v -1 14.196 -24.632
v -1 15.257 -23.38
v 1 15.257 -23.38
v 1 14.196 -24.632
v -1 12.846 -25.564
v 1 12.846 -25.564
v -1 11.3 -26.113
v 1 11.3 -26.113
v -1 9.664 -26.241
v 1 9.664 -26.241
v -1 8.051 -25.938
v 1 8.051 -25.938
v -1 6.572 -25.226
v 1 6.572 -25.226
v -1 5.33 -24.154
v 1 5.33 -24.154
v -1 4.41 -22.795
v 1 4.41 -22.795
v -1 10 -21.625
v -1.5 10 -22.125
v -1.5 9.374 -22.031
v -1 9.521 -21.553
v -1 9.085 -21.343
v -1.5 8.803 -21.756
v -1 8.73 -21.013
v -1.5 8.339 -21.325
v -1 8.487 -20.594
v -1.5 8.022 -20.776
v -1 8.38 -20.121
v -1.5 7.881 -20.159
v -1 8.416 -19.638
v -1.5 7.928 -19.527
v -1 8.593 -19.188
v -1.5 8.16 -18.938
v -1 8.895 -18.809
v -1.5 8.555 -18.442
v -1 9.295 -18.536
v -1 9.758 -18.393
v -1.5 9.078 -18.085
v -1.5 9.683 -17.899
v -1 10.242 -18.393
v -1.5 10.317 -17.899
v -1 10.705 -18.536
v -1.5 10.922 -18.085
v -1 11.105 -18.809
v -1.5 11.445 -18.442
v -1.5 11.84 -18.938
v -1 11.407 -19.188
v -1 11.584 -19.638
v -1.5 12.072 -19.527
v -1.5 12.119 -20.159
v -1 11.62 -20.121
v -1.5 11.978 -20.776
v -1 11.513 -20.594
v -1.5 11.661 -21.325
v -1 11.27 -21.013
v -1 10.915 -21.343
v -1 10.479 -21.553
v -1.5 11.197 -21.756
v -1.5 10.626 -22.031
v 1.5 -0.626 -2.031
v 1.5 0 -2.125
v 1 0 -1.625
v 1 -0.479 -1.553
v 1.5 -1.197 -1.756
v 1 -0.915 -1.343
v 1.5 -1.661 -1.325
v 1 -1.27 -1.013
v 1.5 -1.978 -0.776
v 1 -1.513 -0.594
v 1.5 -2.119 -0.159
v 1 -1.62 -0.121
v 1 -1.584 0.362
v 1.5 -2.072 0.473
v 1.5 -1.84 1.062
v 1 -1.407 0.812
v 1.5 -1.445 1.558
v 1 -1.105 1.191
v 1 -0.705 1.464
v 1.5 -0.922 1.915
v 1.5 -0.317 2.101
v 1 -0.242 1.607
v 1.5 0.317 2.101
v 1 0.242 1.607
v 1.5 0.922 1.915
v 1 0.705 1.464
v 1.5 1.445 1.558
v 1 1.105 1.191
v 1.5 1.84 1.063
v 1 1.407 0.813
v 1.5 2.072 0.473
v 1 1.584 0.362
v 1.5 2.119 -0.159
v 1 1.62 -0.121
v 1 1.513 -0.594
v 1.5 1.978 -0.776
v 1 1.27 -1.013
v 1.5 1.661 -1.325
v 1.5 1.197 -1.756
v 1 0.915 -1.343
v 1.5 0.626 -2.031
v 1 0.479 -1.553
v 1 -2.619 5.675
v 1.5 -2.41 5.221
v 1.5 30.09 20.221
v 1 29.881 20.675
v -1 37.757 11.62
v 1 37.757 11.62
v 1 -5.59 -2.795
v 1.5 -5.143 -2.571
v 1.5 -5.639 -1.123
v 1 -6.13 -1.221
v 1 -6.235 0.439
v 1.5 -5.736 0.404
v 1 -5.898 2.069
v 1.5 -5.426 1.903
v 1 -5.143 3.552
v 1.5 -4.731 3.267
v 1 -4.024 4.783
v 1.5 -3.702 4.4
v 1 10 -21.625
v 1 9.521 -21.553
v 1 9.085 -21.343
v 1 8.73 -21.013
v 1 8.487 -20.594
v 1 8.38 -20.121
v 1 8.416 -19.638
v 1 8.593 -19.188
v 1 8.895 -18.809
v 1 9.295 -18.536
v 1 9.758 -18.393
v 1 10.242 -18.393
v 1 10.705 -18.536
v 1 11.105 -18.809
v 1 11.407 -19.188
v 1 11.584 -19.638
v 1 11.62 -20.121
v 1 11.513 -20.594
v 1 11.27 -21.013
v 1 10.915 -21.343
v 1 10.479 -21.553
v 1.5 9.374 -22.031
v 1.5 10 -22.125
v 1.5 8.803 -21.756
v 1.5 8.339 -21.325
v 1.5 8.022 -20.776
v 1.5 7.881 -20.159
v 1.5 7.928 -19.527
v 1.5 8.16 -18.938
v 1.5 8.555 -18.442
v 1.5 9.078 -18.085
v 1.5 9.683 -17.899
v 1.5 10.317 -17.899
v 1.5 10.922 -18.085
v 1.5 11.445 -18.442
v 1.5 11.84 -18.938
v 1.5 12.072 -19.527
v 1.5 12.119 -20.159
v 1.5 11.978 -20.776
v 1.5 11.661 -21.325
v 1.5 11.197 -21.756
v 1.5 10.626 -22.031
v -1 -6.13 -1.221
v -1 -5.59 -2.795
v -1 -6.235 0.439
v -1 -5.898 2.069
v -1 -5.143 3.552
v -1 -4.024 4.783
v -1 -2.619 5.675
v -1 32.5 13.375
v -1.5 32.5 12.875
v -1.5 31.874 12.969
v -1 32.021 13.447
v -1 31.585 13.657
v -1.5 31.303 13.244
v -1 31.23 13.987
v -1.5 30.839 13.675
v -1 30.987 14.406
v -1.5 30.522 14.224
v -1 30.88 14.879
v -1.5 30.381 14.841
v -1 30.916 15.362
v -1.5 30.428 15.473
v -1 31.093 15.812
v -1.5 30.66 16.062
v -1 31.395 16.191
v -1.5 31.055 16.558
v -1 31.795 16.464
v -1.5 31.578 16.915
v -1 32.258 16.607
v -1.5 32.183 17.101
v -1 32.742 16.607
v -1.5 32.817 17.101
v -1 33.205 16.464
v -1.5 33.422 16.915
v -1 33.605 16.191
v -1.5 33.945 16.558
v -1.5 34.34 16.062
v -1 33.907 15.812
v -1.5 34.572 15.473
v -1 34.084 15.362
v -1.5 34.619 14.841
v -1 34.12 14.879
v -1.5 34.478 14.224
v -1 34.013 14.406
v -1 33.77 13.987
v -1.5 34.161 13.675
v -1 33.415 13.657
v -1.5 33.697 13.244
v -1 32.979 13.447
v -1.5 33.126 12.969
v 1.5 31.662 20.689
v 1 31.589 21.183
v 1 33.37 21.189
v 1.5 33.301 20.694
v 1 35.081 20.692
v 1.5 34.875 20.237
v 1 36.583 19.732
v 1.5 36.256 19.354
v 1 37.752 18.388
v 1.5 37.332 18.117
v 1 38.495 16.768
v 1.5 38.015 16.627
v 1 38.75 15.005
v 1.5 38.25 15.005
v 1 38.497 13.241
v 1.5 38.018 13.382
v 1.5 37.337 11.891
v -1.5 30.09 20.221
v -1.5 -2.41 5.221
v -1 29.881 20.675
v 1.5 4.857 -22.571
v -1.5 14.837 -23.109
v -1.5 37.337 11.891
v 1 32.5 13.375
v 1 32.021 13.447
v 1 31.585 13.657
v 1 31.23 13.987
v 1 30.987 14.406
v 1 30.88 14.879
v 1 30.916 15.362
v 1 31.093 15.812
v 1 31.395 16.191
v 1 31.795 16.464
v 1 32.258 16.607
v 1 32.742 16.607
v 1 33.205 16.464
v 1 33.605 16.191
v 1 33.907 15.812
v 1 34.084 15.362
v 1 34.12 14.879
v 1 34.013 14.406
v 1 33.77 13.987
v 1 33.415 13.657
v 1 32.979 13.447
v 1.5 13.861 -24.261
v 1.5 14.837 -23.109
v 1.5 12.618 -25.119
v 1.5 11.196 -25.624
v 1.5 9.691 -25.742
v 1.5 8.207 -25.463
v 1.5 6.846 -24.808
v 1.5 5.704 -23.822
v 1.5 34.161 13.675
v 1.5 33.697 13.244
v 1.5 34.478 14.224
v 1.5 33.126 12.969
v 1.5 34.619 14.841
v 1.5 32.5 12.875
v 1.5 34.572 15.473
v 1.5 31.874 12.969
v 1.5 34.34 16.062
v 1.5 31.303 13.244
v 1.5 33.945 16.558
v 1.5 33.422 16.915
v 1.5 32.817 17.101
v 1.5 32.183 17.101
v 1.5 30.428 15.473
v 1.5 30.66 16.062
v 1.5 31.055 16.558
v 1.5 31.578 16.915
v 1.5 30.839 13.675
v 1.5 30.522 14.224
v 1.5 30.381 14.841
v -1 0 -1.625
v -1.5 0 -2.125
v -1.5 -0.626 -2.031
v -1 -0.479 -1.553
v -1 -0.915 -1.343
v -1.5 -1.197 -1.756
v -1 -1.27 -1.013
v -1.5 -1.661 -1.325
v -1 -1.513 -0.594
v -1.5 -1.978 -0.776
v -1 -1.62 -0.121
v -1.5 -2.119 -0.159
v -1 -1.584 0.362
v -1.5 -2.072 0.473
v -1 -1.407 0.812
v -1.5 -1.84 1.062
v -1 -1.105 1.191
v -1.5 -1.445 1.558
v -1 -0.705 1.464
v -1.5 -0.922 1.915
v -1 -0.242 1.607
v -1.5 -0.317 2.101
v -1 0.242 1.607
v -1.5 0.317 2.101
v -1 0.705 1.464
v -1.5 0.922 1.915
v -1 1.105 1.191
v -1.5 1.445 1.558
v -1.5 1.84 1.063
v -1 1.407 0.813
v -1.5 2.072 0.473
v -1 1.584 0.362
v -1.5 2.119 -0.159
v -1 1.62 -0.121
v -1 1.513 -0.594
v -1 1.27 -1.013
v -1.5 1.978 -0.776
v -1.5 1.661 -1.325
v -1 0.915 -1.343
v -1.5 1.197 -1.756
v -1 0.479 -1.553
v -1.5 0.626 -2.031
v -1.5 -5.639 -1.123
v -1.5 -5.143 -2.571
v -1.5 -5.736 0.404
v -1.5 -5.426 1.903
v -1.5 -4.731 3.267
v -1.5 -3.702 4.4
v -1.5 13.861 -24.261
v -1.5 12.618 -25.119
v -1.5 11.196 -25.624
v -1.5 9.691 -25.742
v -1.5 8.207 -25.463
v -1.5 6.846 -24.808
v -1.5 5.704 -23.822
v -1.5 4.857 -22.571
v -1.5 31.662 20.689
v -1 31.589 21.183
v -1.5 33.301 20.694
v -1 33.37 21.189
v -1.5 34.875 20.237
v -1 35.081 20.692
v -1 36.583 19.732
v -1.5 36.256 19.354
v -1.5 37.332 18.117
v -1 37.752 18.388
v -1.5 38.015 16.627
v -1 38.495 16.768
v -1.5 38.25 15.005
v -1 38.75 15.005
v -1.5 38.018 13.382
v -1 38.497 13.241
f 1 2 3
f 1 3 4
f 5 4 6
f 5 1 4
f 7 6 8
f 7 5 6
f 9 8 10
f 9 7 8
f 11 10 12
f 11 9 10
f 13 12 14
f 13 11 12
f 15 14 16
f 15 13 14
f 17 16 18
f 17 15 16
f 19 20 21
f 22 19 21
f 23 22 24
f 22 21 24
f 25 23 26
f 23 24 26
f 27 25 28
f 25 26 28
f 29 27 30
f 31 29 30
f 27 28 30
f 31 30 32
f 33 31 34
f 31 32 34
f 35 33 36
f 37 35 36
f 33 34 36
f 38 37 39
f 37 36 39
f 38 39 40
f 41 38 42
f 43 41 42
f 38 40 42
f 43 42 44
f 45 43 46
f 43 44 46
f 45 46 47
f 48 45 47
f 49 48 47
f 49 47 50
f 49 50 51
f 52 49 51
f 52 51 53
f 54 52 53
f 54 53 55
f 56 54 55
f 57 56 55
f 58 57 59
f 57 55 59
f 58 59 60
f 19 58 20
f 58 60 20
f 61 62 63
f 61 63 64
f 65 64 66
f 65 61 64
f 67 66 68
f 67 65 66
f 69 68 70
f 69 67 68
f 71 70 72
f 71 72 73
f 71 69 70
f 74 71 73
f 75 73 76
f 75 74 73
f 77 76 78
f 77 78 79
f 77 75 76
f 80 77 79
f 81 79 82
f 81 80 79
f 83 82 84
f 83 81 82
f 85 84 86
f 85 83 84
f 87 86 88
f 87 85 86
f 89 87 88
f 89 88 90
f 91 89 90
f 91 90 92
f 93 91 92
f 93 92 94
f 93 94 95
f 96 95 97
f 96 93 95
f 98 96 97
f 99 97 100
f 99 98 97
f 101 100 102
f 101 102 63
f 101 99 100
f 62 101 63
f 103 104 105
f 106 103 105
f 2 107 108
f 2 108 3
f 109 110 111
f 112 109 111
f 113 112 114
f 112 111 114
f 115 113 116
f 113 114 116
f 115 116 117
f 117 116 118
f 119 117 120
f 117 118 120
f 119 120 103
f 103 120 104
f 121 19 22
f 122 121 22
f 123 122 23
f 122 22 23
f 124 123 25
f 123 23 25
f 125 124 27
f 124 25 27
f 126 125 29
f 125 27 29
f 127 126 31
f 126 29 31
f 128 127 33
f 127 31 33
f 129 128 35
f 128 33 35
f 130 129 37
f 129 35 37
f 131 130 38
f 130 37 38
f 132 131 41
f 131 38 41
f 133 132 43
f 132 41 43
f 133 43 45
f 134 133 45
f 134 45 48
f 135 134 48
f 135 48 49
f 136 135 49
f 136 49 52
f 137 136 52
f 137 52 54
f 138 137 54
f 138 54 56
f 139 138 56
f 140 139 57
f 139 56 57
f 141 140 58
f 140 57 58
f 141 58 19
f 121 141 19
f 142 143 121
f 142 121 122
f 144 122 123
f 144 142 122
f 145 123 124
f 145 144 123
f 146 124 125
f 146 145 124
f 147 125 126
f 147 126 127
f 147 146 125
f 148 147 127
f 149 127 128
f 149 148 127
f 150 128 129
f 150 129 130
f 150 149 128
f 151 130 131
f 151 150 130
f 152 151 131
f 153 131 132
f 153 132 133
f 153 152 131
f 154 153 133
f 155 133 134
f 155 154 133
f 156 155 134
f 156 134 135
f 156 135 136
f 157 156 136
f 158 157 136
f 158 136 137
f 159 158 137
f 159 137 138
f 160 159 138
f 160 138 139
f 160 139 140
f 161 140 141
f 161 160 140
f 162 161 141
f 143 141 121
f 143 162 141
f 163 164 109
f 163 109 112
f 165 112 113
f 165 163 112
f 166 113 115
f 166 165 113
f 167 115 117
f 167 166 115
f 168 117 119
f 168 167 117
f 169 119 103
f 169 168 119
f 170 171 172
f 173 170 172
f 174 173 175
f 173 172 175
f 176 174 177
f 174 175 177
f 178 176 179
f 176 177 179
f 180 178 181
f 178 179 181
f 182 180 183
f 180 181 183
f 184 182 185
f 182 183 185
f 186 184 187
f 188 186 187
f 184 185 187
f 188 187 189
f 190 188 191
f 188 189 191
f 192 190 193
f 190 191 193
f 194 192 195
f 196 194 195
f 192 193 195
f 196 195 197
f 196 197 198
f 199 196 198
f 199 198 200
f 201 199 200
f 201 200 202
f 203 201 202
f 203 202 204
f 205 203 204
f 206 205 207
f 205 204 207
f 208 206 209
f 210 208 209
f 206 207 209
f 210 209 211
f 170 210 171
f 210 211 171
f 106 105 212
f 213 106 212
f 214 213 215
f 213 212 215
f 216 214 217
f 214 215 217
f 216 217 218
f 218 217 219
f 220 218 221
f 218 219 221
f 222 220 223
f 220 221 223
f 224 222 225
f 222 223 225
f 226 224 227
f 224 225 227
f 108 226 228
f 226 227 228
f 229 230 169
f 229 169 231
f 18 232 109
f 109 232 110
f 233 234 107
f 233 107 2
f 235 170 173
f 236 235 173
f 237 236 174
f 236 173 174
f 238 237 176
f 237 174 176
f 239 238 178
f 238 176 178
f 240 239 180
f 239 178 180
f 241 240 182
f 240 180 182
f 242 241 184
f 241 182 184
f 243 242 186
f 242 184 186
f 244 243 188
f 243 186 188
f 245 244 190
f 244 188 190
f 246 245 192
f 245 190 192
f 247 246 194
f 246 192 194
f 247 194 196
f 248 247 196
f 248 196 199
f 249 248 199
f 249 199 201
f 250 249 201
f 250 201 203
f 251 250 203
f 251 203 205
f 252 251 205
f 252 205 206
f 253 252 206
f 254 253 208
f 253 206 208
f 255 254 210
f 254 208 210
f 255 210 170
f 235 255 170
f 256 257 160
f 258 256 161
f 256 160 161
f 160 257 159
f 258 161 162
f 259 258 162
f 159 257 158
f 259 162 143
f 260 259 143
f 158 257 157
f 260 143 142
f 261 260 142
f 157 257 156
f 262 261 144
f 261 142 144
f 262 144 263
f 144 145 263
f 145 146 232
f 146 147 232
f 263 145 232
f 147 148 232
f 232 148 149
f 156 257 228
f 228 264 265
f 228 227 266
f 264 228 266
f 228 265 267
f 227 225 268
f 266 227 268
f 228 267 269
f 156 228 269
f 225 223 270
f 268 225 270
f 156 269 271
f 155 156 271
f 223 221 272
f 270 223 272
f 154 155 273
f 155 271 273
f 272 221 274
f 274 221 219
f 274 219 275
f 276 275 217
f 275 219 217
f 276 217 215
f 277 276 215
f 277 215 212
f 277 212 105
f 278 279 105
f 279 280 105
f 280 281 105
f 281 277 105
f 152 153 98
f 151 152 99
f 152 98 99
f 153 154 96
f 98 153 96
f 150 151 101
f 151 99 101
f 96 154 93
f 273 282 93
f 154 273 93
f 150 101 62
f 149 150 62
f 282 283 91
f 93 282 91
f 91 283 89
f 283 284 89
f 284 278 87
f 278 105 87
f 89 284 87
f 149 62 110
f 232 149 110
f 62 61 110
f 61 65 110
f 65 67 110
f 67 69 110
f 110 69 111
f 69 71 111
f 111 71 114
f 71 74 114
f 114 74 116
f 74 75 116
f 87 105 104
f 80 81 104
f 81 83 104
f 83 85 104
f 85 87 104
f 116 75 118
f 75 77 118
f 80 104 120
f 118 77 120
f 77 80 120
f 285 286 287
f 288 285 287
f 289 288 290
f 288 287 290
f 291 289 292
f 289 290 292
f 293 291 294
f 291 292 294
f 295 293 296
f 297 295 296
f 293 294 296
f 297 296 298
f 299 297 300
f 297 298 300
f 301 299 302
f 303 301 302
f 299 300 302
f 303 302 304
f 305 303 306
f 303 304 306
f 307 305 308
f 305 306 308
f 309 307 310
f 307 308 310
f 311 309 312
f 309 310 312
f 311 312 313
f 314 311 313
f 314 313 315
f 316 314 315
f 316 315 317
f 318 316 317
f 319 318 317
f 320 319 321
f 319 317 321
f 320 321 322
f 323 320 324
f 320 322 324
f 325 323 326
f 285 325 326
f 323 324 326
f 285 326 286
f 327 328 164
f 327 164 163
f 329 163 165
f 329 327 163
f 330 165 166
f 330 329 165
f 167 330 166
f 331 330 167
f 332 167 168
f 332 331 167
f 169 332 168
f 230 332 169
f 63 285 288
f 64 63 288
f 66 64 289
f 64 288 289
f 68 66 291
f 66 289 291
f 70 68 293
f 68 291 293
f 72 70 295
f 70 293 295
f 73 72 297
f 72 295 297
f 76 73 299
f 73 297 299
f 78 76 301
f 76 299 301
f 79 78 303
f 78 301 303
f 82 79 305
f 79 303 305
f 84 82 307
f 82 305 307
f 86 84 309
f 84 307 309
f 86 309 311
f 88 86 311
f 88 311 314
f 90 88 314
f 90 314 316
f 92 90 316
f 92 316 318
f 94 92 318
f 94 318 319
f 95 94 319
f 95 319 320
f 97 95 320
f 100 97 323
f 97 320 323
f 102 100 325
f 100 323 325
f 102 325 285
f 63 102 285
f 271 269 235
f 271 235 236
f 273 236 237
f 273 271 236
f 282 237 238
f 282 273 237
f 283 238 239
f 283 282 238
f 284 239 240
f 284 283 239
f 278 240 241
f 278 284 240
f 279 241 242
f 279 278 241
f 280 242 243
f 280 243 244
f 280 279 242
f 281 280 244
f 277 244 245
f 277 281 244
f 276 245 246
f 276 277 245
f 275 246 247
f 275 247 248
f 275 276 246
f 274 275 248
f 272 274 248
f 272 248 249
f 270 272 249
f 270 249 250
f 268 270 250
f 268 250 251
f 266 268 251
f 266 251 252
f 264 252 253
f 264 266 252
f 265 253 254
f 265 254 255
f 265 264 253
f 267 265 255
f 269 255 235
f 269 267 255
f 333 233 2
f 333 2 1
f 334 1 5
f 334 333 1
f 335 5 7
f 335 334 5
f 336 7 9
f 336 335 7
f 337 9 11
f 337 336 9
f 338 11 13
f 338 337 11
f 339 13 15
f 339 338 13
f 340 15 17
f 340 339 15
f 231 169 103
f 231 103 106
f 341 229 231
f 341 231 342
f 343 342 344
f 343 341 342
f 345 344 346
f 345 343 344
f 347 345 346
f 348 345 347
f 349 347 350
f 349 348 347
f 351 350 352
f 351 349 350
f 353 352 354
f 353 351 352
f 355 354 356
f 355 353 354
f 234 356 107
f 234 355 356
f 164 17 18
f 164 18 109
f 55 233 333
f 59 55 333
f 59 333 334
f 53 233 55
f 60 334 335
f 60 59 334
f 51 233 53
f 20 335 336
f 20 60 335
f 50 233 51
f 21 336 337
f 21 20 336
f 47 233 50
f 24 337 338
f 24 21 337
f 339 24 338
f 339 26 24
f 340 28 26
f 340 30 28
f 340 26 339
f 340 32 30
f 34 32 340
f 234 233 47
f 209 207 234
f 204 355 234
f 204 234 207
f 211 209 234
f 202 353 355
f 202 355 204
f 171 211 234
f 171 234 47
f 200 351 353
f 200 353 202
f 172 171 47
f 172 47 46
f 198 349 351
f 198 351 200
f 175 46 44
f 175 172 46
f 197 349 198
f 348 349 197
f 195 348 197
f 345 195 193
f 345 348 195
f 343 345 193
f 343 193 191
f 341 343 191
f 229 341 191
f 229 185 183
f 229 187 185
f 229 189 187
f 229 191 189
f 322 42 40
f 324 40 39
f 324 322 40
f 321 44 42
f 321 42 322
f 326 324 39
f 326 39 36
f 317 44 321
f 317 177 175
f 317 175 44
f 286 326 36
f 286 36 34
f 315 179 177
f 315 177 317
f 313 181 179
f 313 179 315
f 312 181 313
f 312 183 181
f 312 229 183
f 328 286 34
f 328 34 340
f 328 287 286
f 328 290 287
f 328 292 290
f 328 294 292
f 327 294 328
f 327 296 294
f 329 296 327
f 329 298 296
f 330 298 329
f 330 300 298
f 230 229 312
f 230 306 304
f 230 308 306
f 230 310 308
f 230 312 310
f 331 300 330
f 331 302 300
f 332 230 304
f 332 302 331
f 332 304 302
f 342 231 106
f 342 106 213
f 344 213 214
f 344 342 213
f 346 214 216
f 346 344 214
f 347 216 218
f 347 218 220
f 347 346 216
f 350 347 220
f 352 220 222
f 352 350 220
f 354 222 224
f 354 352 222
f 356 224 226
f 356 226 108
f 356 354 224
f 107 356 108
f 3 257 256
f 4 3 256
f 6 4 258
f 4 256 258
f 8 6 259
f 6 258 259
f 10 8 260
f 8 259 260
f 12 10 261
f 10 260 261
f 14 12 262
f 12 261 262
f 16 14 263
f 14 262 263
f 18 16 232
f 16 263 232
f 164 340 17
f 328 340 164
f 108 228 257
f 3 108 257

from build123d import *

# Parameters (mm, degrees)
SKETCH_1_R          = 1.625
EXTRUDE_1_DEPTH     = 3
CHAMFER_1_SIZE      = 0.5
CUT_EXTRUDE_1_DEPTH = 10
CHAMFER_2_SIZE      = 0.5
EXTRUDE_2_DEPTH     = 3


with BuildPart() as part:
    # 草图1 → 凸台-拉伸1 (new body)
    with BuildSketch(Plane(origin=(-1.5, 0, 0), x_dir=(0, -1, 0), z_dir=(-1, 0, 0))):
        with BuildLine():
            Line((-4.409830069, -22.795084974), (5.590169942, -2.795084974))
            ThreePointArc((5.590169942, -2.795084974), (5.897676995, 2.068793383), (2.619113609, 5.674746153))
            Line((2.619113609, 5.674746153), (-29.880886391, 20.674746153))
            ThreePointArc((-29.880886391, 20.674746153), (-37.215506358, 19.102011676), (-37.757365472, 11.620265055))
            Line((-37.757365472, 11.620265055), (-15.257365483, -23.379734945))
            ThreePointArc((-15.257365483, -23.379734945), (-9.663631759, -26.240941948), (-4.409830069, -22.795084974))
        make_face()
        with Locations(Location((0, 0, 0), (0, 0, 270))):
            Circle(SKETCH_1_R, mode=Mode.SUBTRACT)
        with Locations(Location((-32.5, 15, 0), (0, 0, 270))):
            Circle(SKETCH_1_R, mode=Mode.SUBTRACT)
        with Locations(Location((-10.000000011, -20, 0), (0, 0, 270))):
            Circle(SKETCH_1_R, mode=Mode.SUBTRACT)
        with BuildLine():
            Line((-25.696229087, 9.501814319), (-12.177289309, -11.527647568))
            ThreePointArc((-12.177289309, -11.527647568), (-12.703025857, -13.946035685), (-15.121413973, -13.420299137))
            Line((-15.121413973, -13.420299137), (-28.640353751, 7.60916275))
            ThreePointArc((-28.640353751, 7.60916275), (-28.114617204, 10.027550867), (-25.696229087, 9.501814319))
        make_face(mode=Mode.SUBTRACT)
        with BuildLine():
            Line((-15.542003206, 7.113468289), (-6.078745362, -7.607155033))
            ThreePointArc((-6.078745362, -7.607155033), (-6.604481909, -10.025543149), (-9.022870026, -9.499806601))
            Line((-9.022870026, -9.499806601), (-18.48612787, 5.22081672))
            ThreePointArc((-18.48612787, 5.22081672), (-17.960391323, 7.639204836), (-15.542003206, 7.113468289))
        make_face(mode=Mode.SUBTRACT)
    extrude(amount=-EXTRUDE_1_DEPTH)

    # 倒角1
    chamfer_1_edges = [part.edges().sort_by_distance(p)[0] for p in [
        (1.5, -5.897676995, 2.068793383),
        (1.5, 13.630886391, 13.174746153),
        (1.5, 0, 1.625),
        (-1.5, 0, 1.625),
        (1.5, 32.5, 16.625),
        (1.5, 37.215506358, 19.102011676),
        (-1.5, 32.5, 16.625),
        (1.5, 10.000000011, -18.375),
        (1.5, 26.507365477, -5.879734945),
        (-1.5, 10.000000011, -18.375),
        (1.5, 28.114617204, 10.027550867),
        (1.5, 18.936759198, -1.012916624),
        (1.5, 12.703025857, -13.946035685),
        (1.5, 21.880883862, -2.905568193),
        (-1.5, 28.114617204, 10.027550867),
        (-1.5, 21.880883862, -2.905568193),
        (-1.5, 12.703025857, -13.946035685),
        (-1.5, 18.936759198, -1.012916624),
        (1.5, 17.960391323, 7.639204836),
        (1.5, 10.810374284, -0.246843372),
        (1.5, 6.604481909, -10.025543149),
        (1.5, 13.754498948, -2.139494941),
        (-1.5, 17.960391323, 7.639204836),
        (-1.5, 13.754498948, -2.139494941),
        (-1.5, 6.604481909, -10.025543149),
        (-1.5, 10.810374284, -0.246843372),
        (1.5, 9.663631759, -26.240941948),
        (-1.5, 26.507365477, -5.879734945),
        (-1.5, 37.215506358, 19.102011676),
        (-1.5, 13.630886391, 13.174746153),
        (-1.5, -5.897676995, 2.068793383),
        (-1.5, -0.590169937, -12.795084974),
        (-1.5, 9.663631759, -26.240941948),
        (1.5, -0.590169937, -12.795084974),
    ]]
    chamfer(chamfer_1_edges, length=CHAMFER_1_SIZE)

    # 草图2 → 切除-拉伸1 (cut)
    with BuildSketch(Plane(origin=(1.5, 0, 0), x_dir=(0, 0, -1), z_dir=(1, 0, 0))):
        with BuildLine():
            Line((-3.928015544, 10.805893754), (0.277876833, 8.102105799))
            ThreePointArc((0.277876833, 8.102105799), (0.803613381, 5.683717682), (-1.614774736, 5.157981135))
            Line((-1.614774736, 5.157981135), (-5.820667113, 7.86176909))
            ThreePointArc((-5.820667113, 7.86176909), (-6.346403661, 10.280157207), (-3.928015544, 10.805893754))
        make_face()
    extrude(amount=-CUT_EXTRUDE_1_DEPTH, mode=Mode.SUBTRACT)

    # 倒角2
    chamfer_2_edges = [part.edges().sort_by_distance(p)[0] for p in [
        (-1.5, 5.683717682, -0.803613381),
        (-1.5, 9.453999777, 1.825069356),
        (-1.5, 10.280157207, 6.346403661),
        (-1.5, 6.509875112, 3.717720925),
        (1.5, 9.453999777, 1.825069356),
        (1.5, 6.509875112, 3.717720925),
        (1.5, 5.683717682, -0.803613381),
        (1.5, 10.280157207, 6.346403661),
    ]]
    chamfer(chamfer_2_edges, length=CHAMFER_2_SIZE)

    # Sketch 3D_1 → 凸台-拉伸2 (add)
    with BuildSketch(Plane(origin=(1.5, 33.431032362, 9.779789625), x_dir=(0, -0.8679628670019027, -0.49662909852911097), z_dir=(1, 0, 0))):
        Polygon((0, 0), (27.366404933, 14.397799707), (33.391580963, 10.950327639), (36.801934048, 0), (32.111357291, -5.715828848), (26.004298505, -10.99963533), (16.146301167, -10.675777123), (2.885850361, -3.94968319), align=None)
    extrude(amount=-EXTRUDE_2_DEPTH)


solid = part.part
